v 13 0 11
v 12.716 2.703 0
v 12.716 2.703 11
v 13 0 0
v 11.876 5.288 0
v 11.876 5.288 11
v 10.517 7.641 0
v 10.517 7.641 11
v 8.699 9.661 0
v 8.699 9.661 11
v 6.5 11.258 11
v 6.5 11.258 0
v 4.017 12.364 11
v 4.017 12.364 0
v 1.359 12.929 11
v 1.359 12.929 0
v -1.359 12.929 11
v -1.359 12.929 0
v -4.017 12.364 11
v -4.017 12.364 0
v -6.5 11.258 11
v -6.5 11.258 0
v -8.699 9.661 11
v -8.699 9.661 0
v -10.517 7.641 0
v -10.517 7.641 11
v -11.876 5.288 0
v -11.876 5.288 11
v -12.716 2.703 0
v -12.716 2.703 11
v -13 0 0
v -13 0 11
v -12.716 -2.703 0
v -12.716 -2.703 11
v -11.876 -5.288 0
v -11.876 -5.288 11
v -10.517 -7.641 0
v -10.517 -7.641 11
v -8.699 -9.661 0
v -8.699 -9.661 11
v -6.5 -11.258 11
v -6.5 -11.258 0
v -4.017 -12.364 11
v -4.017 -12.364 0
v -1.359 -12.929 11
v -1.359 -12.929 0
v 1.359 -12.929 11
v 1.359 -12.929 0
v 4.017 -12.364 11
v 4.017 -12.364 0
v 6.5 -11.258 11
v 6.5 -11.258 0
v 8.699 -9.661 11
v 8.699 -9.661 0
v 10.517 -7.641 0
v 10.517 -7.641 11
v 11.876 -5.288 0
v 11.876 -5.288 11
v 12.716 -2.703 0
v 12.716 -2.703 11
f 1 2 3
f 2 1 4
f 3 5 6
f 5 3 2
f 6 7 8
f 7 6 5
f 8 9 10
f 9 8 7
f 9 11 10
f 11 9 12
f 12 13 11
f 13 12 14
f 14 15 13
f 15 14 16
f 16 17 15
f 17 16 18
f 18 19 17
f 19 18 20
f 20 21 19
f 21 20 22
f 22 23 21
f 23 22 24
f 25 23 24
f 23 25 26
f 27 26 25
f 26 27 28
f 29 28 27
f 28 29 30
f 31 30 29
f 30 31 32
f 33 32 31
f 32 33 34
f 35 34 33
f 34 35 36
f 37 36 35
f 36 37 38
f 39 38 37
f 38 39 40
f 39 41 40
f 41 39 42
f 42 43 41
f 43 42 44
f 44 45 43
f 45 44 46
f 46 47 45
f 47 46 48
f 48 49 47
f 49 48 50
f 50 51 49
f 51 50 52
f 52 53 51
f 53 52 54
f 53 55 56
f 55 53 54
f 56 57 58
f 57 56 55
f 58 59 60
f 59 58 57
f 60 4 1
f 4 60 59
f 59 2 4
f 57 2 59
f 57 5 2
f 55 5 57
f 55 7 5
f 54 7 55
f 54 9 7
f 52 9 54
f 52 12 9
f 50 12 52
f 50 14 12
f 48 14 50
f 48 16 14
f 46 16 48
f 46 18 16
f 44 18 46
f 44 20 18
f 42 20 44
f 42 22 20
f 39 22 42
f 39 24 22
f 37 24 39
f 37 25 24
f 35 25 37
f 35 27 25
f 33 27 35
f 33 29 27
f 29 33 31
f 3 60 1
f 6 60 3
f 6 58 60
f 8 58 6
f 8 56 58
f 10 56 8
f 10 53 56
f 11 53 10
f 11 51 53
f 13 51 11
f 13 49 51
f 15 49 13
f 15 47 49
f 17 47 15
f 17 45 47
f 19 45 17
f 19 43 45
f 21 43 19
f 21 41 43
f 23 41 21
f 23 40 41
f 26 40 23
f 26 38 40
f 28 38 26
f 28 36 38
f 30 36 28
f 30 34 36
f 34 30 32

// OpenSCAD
// Generated by SolidPython 1.0.1 on 2020-07-29 00:39:25


cylinder(h = 11, r1 = 13, r2 = 13);
/***********************************************
*********      SolidPython code:      **********
************************************************
 
# import packages: SolidPython
from solid import *
from solid.utils import *
from itertools import chain, combinations


class Resize:

    def __init__(self, scad_file):
        self.scad_file = scad_file
        #self.scad_file = import_scad(scad_file)
        # cone/cylinder param:
        self.r1 = 0
        self.r2 = 0
        self.h = 0
        # rectangular prism param:
        self.w = 0
        self.l = 0
        # ellipse param:
        self.r = 0

    # import OpenScad code (file name corresponds to shape)


    # classify shape + parameters
    def assign(self, param1, param2, param3):
        if self.scad_file == 'cone.scad':
            self.r1 = param1
            self.r2 = param2
            self.h = param3
        elif self.scad_file == 'cylinder.scad':
            self.r1 = param1
            self.r2 = param2
            self.h = param3
        elif self.scad_file == 'rectangularPrism.scad':
            self.h = param1
            self.l = param2
            self.w = param3
        else:
            self.r = param1
            self.h = param2

    # resize parameters
    def iterate(self):
        x = range(3, 20, 2)
        i = 1
        if self.scad_file == 'cone.scad':
            tempList = list(combinations(x, 2))
            for temp in tempList:
                param1 = temp[0]
                param2 = temp[1]
                filepath = 'produced_scad_files/' + 'cone' + str(param1) + '_' + str(param2) + '_' + '.scad'
                scad_render_to_file(cylinder(h=param1, r1=param2, r2=0), filepath)

        elif self.scad_file == 'cylinder.scad':
            tempList = list(combinations(x, 3))
            for temp in tempList:
                param1 = temp[0]
                param2 = temp[1]
                filepath = 'produced_scad_files/' + 'cylinder' + str(param1) + '_' + str(param2) + '_' + '.scad'
                scad_render_to_file(cylinder(h=param1, r1=param2, r2=param2), filepath)

        elif self.scad_file == 'rectangularPrism.scad':
            tempList = list(combinations(x, 3))
            for temp in tempList:
                param1 = temp[0]
                param2 = temp[1]
                param3 = temp[2]
                filepath = 'produced_scad_files/' + 'rectangularPrism' + str(param1) + '_' + str(param2) + '_' + str(
                    param3) + '.scad'
                scad_render_to_file(cube(size=(param1, param2, param3)), filepath)

        elif self.scad_file == 'ellipse.scad':
            tempList = list(combinations(x, 4))
            for temp in tempList:
                param1 = temp[0]
                param2 = temp[1]
                param3 = temp[2]
                param4 = temp[3]
                filepath = 'produced_scad_files/' + 'ellipse' + str(param1) + '_' + str(param2) + '_' + str(param3) + '_' + str(param4) + '.scad'
                scad_render_to_file(scale([param1, param2, param3])(sphere(r=param4)), filepath)

    def render_to_scadfile(self):
        scad_render_to_file(scad, 'example.scad') 
 
************************************************/
